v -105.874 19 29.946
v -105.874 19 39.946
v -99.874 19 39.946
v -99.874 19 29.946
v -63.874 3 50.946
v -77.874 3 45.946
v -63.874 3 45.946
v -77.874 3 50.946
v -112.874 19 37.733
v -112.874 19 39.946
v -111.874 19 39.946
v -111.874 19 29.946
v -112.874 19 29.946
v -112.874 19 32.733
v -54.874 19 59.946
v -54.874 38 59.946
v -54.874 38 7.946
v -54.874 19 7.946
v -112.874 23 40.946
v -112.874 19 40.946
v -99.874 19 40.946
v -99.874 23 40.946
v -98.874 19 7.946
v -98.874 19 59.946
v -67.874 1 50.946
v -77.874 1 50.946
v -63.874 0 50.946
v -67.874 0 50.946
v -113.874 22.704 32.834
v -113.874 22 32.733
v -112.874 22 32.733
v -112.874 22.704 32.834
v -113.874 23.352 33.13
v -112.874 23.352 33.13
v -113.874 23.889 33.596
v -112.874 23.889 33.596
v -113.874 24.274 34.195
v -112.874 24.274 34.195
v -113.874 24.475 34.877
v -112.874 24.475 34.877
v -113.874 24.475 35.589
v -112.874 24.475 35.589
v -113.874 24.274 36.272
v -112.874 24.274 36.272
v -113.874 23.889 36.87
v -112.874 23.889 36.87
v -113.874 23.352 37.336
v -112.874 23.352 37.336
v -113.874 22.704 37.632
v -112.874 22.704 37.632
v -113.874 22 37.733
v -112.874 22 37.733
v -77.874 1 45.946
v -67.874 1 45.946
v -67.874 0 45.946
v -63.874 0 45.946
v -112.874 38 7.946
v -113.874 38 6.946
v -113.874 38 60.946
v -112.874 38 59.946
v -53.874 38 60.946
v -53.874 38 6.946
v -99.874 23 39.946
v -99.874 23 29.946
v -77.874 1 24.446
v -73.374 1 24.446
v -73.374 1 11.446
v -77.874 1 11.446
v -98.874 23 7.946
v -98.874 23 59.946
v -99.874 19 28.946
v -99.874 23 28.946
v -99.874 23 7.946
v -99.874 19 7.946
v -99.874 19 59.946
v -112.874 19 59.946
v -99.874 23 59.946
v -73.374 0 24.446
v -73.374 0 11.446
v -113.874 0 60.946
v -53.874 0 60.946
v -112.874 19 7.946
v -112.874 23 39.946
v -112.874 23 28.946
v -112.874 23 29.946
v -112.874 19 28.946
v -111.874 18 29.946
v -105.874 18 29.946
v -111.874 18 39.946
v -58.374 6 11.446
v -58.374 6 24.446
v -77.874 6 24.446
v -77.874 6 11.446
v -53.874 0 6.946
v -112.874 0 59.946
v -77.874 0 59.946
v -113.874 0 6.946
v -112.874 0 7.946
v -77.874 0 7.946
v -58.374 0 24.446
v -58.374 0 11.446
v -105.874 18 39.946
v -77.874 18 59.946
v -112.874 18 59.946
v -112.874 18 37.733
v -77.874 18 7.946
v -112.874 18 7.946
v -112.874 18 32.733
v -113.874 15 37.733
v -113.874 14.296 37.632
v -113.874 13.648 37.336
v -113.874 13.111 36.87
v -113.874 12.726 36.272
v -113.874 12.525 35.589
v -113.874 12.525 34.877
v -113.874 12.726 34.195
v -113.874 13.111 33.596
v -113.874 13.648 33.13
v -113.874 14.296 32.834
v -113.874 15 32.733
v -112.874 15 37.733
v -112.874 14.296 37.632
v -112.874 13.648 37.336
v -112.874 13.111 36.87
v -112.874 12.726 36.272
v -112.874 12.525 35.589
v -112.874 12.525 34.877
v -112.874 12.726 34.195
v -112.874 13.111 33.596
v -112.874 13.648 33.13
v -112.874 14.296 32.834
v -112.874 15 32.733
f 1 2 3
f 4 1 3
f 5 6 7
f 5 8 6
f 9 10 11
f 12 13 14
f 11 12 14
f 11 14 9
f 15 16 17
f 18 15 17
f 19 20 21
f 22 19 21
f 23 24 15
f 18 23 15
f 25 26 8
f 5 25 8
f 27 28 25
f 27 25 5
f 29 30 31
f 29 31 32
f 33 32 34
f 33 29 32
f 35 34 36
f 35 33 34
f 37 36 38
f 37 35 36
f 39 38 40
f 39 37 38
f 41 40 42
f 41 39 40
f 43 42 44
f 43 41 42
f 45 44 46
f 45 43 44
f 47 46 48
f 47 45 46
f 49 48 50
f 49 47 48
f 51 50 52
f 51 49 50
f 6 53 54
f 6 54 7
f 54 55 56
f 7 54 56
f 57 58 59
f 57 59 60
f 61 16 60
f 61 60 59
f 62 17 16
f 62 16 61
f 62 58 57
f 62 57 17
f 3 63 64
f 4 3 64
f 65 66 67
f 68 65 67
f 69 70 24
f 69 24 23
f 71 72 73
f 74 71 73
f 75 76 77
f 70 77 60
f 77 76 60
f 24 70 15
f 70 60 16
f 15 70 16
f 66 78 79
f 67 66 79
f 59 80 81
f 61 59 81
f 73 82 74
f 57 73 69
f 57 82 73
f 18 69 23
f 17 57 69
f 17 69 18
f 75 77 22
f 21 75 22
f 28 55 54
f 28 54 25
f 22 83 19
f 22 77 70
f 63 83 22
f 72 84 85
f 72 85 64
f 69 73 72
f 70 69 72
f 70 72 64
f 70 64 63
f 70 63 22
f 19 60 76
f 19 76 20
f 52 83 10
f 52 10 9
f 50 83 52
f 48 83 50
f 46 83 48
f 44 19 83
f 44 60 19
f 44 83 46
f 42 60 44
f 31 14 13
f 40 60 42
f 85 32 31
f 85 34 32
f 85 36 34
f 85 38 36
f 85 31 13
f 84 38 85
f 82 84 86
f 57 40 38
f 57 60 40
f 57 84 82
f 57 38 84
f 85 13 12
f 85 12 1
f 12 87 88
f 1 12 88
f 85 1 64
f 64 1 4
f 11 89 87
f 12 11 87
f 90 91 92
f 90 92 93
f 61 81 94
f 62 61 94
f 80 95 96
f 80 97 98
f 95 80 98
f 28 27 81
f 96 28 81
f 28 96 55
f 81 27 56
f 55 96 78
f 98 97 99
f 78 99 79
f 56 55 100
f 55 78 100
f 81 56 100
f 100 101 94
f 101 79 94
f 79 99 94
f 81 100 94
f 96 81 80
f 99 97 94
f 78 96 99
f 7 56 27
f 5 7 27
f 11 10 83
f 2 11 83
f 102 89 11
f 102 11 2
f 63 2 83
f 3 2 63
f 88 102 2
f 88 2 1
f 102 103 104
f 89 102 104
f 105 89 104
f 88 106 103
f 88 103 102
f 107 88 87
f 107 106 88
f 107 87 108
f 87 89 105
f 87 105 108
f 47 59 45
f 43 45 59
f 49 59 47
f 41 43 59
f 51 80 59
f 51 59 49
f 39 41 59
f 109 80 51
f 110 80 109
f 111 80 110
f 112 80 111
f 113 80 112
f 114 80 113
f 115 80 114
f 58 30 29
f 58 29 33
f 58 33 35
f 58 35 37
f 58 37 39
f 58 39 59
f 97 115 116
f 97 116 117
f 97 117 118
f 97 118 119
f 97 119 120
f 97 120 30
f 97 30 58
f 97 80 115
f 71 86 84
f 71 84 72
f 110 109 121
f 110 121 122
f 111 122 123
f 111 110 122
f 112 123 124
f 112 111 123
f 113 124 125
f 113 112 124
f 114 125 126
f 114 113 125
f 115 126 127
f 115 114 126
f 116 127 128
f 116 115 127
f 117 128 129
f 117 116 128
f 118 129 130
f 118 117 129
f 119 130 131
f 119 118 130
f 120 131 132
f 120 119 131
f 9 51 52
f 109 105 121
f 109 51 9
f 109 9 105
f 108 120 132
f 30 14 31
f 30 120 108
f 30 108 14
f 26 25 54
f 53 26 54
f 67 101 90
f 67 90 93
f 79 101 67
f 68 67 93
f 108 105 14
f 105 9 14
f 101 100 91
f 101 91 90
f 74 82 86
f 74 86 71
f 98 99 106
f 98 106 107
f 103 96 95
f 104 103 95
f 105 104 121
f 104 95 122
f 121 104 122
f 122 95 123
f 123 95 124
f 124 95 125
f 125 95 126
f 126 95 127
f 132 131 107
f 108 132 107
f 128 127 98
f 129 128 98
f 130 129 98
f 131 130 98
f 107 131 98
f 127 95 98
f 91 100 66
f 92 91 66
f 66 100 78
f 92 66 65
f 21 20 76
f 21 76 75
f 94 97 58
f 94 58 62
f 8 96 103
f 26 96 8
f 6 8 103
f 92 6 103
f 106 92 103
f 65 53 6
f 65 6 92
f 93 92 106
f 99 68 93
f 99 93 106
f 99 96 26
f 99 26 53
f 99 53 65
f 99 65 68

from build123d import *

# Parameters (mm, degrees)
SKETCH1_W           = 60
SKETCH1_H           = 54
BOSS_EXTRUDE1_DEPTH = 38
SKETCH2_W           = 44
SKETCH2_H           = 52
CUT_EXTRUDE1_DEPTH  = 19
SKETCH3_W           = 35
SKETCH3_H           = 52
CUT_EXTRUDE2_DEPTH  = 18
SKETCH4_W           = 6
SKETCH4_H           = 10
CUT_EXTRUDE3_DEPTH  = 38
SKETCH5_W           = 14
SKETCH5_H           = 52
CUT_EXTRUDE5_DEPTH  = 15
SKETCH6_W           = 13
SKETCH6_H           = 52
CUT_EXTRUDE6_DEPTH  = 4
SKETCH8_W           = 15
SKETCH8_H           = 13
CUT_EXTRUDE7_DEPTH  = 6
SKETCH10_W          = 13
SKETCH10_H          = 5
CUT_EXTRUDE8_DEPTH  = 6
SKETCH11_W          = 4
SKETCH11_H          = 5
CUT_EXTRUDE9_DEPTH  = 3
SKETCH12_W          = 5
SKETCH12_H          = 2
CUT_EXTRUDE10_DEPTH = 13
CUT_EXTRUDE11_DEPTH = 1
SKETCH14_W          = 13
SKETCH14_H          = 1
BOSS_EXTRUDE2_DEPTH = 4
SKETCH15_W          = 13
SKETCH15_H          = 1
BOSS_EXTRUDE3_DEPTH = 4


with BuildPart() as part:
    # Sketch1 → Boss-Extrude1 (new body)
    with BuildSketch(Plane(origin=(0, 0, 0), x_dir=(1, 0, 0), z_dir=(0, 1, 0))):
        with Locations((-83.874465942, -33.946435202)):
            Rectangle(SKETCH1_W, SKETCH1_H)
    extrude(amount=BOSS_EXTRUDE1_DEPTH)

    # Sketch2 → Cut-Extrude1 (cut)
    with BuildSketch(Plane(origin=(0, 38, 0), x_dir=(1, 0, 0), z_dir=(0, 1, 0))):
        with Locations((-76.874465942, -33.946435202)):
            Rectangle(SKETCH2_W, SKETCH2_H)
    extrude(amount=-CUT_EXTRUDE1_DEPTH, mode=Mode.SUBTRACT)

    # Sketch3 → Cut-Extrude2 (cut)
    with BuildSketch(Plane(origin=(0, 0, 0), x_dir=(-1, 0, 0), z_dir=(0, -1, 0))):
        with Locations((95.374465942, -33.946435202)):
            Rectangle(SKETCH3_W, SKETCH3_H)
    extrude(amount=-CUT_EXTRUDE2_DEPTH, mode=Mode.SUBTRACT)

    # Sketch4 → Cut-Extrude3 (cut)
    with BuildSketch(Plane(origin=(0, 18, 0), x_dir=(-1, 0, 0), z_dir=(0, -1, 0))):
        with Locations((108.874465942, -34.946435202)):
            Rectangle(SKETCH4_W, SKETCH4_H)
    extrude(amount=-CUT_EXTRUDE3_DEPTH, mode=Mode.SUBTRACT)

    # Sketch5 → Cut-Extrude5 (cut)
    with BuildSketch(Plane(origin=(0, 38, 0), x_dir=(1, 0, 0), z_dir=(0, 1, 0))):
        with Locations((-105.874465942, -33.946435202)):
            Rectangle(SKETCH5_W, SKETCH5_H)
    extrude(amount=-CUT_EXTRUDE5_DEPTH, mode=Mode.SUBTRACT)

    # Sketch6 → Cut-Extrude6 (cut)
    with BuildSketch(Plane(origin=(0, 23, 0), x_dir=(1, 0, 0), z_dir=(0, 1, 0))):
        with Locations((-106.374465942, -33.946435202)):
            Rectangle(SKETCH6_W, SKETCH6_H)
    extrude(amount=-CUT_EXTRUDE6_DEPTH, mode=Mode.SUBTRACT)

    # Sketch8 → Cut-Extrude7 (cut)
    with BuildSketch(Plane(origin=(0, 0, 0), x_dir=(-1, 0, 0), z_dir=(0, -1, 0))):
        with Locations((65.874465942, -17.946435202)):
            Rectangle(SKETCH8_W, SKETCH8_H)
    extrude(amount=-CUT_EXTRUDE7_DEPTH, mode=Mode.SUBTRACT)

    # Sketch10 → Cut-Extrude8 (cut)
    with BuildSketch(Plane(origin=(-73.374465942, 0, 0), x_dir=(0, 0, -1), z_dir=(1, 0, 0))):
        with Locations((-17.946435202, 3.5)):
            Rectangle(SKETCH10_W, SKETCH10_H)
    extrude(amount=-CUT_EXTRUDE8_DEPTH, mode=Mode.SUBTRACT)

    # Sketch11 → Cut-Extrude9 (cut)
    with BuildSketch(Plane.XZ):
        with Locations((-65.874465942, 48.446435202)):
            Rectangle(SKETCH11_W, SKETCH11_H)
    extrude(amount=-CUT_EXTRUDE9_DEPTH, mode=Mode.SUBTRACT)

    # Sketch12 → Cut-Extrude10 (cut)
    with BuildSketch(Plane(origin=(-67.874465942, 0, 0), x_dir=(0, 0, -1), z_dir=(1, 0, 0))):
        with Locations((-48.446435202, 2)):
            Rectangle(SKETCH12_W, SKETCH12_H)
    extrude(amount=-CUT_EXTRUDE10_DEPTH, mode=Mode.SUBTRACT)

    # Sketch13 → Cut-Extrude11 (cut)
    with BuildSketch(Plane.ZY.offset(113.874465942)):
        with BuildLine():
            Line((32.733045904, 15), (32.733045904, 22))
            ThreePointArc((32.733045904, 22), (35.233045904, 24.5), (37.733045904, 22))
            Line((37.733045904, 22), (37.733045904, 15))
            ThreePointArc((37.733045904, 15), (35.233045904, 12.5), (32.733045904, 15))
        make_face()
    extrude(amount=-CUT_EXTRUDE11_DEPTH, mode=Mode.SUBTRACT)

    # Sketch14 → Boss-Extrude2 (add)
    with BuildSketch(Plane(origin=(0, 19, 0), x_dir=(1, 0, 0), z_dir=(0, 1, 0))):
        with Locations((-106.374465942, -40.446435202)):
            Rectangle(SKETCH14_W, SKETCH14_H)
    extrude(amount=BOSS_EXTRUDE2_DEPTH)

    # Sketch15 → Boss-Extrude3 (add)
    with BuildSketch(Plane(origin=(0, 19, 0), x_dir=(1, 0, 0), z_dir=(0, 1, 0))):
        with Locations((-106.374465942, -29.446435202)):
            Rectangle(SKETCH15_W, SKETCH15_H)
    extrude(amount=BOSS_EXTRUDE3_DEPTH)


solid = part.part
